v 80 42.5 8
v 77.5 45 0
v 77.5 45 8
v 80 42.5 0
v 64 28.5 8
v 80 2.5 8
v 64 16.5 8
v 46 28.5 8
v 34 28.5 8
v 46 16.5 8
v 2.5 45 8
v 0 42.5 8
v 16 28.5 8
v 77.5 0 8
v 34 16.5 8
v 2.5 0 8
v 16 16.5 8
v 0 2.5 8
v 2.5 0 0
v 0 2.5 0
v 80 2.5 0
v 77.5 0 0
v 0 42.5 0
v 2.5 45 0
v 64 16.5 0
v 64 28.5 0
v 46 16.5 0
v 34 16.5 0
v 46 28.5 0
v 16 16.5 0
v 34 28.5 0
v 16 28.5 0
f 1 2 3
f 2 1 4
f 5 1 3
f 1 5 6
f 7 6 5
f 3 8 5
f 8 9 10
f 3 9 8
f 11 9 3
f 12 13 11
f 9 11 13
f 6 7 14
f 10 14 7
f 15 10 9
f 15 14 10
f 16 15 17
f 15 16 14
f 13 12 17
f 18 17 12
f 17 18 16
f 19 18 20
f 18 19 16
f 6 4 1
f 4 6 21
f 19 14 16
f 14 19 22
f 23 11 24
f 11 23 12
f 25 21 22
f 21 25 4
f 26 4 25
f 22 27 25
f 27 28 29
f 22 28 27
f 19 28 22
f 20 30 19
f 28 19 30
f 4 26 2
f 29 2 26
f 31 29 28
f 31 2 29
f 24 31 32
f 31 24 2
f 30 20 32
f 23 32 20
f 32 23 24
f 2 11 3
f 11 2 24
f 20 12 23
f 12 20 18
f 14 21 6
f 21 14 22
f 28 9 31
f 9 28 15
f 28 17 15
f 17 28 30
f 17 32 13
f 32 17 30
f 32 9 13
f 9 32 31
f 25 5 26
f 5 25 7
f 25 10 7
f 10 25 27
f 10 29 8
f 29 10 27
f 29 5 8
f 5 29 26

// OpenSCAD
$fn = 32;

// ----------------------------------------------------------------------
// Windowed plate: 2 voids, 80 x 45 x 8 mm
// ----------------------------------------------------------------------

// --- parameters (mm) ---
plate_l = 80;             // plate length, X
plate_w = 45;             // plate width, Y
plate_t = 8;              // plate thickness, Z
edge_margin = 10;         // wall from the plate edge to any window
windows = 2;              // number of windows in the row
win_l = 18;               // window length
win_w = 12;               // window width
win_pitch = 30;           // window pitch along X
depth_1 = 8;              // depth of void 1 (full thickness = through)
depth_2 = 8;              // depth of void 2 (full thickness = through)
corner_c = 2.5;           // corner chamfer of the plate

profile = [[2.5, 0], [77.5, 0], [80, 2.5], [80, 42.5], [77.5, 45], [2.5, 45], [0, 42.5], [0, 2.5]];  // primary outline, 8 points, counter clockwise
void_1 = [[16, 16.5], [34, 16.5], [34, 28.5], [16, 28.5]];  // window 1 of the row, 4 points
void_2 = [[46, 16.5], [64, 16.5], [64, 28.5], [46, 28.5]];  // window 2 of the row, 4 points

// --- the one profile operation ---
difference() {
  linear_extrude(height = plate_t) polygon(points = profile);
  translate([0, 0, -1])
    linear_extrude(height = plate_t + 2) polygon(points = void_1);
  translate([0, 0, -1])
    linear_extrude(height = plate_t + 2) polygon(points = void_2);
}
